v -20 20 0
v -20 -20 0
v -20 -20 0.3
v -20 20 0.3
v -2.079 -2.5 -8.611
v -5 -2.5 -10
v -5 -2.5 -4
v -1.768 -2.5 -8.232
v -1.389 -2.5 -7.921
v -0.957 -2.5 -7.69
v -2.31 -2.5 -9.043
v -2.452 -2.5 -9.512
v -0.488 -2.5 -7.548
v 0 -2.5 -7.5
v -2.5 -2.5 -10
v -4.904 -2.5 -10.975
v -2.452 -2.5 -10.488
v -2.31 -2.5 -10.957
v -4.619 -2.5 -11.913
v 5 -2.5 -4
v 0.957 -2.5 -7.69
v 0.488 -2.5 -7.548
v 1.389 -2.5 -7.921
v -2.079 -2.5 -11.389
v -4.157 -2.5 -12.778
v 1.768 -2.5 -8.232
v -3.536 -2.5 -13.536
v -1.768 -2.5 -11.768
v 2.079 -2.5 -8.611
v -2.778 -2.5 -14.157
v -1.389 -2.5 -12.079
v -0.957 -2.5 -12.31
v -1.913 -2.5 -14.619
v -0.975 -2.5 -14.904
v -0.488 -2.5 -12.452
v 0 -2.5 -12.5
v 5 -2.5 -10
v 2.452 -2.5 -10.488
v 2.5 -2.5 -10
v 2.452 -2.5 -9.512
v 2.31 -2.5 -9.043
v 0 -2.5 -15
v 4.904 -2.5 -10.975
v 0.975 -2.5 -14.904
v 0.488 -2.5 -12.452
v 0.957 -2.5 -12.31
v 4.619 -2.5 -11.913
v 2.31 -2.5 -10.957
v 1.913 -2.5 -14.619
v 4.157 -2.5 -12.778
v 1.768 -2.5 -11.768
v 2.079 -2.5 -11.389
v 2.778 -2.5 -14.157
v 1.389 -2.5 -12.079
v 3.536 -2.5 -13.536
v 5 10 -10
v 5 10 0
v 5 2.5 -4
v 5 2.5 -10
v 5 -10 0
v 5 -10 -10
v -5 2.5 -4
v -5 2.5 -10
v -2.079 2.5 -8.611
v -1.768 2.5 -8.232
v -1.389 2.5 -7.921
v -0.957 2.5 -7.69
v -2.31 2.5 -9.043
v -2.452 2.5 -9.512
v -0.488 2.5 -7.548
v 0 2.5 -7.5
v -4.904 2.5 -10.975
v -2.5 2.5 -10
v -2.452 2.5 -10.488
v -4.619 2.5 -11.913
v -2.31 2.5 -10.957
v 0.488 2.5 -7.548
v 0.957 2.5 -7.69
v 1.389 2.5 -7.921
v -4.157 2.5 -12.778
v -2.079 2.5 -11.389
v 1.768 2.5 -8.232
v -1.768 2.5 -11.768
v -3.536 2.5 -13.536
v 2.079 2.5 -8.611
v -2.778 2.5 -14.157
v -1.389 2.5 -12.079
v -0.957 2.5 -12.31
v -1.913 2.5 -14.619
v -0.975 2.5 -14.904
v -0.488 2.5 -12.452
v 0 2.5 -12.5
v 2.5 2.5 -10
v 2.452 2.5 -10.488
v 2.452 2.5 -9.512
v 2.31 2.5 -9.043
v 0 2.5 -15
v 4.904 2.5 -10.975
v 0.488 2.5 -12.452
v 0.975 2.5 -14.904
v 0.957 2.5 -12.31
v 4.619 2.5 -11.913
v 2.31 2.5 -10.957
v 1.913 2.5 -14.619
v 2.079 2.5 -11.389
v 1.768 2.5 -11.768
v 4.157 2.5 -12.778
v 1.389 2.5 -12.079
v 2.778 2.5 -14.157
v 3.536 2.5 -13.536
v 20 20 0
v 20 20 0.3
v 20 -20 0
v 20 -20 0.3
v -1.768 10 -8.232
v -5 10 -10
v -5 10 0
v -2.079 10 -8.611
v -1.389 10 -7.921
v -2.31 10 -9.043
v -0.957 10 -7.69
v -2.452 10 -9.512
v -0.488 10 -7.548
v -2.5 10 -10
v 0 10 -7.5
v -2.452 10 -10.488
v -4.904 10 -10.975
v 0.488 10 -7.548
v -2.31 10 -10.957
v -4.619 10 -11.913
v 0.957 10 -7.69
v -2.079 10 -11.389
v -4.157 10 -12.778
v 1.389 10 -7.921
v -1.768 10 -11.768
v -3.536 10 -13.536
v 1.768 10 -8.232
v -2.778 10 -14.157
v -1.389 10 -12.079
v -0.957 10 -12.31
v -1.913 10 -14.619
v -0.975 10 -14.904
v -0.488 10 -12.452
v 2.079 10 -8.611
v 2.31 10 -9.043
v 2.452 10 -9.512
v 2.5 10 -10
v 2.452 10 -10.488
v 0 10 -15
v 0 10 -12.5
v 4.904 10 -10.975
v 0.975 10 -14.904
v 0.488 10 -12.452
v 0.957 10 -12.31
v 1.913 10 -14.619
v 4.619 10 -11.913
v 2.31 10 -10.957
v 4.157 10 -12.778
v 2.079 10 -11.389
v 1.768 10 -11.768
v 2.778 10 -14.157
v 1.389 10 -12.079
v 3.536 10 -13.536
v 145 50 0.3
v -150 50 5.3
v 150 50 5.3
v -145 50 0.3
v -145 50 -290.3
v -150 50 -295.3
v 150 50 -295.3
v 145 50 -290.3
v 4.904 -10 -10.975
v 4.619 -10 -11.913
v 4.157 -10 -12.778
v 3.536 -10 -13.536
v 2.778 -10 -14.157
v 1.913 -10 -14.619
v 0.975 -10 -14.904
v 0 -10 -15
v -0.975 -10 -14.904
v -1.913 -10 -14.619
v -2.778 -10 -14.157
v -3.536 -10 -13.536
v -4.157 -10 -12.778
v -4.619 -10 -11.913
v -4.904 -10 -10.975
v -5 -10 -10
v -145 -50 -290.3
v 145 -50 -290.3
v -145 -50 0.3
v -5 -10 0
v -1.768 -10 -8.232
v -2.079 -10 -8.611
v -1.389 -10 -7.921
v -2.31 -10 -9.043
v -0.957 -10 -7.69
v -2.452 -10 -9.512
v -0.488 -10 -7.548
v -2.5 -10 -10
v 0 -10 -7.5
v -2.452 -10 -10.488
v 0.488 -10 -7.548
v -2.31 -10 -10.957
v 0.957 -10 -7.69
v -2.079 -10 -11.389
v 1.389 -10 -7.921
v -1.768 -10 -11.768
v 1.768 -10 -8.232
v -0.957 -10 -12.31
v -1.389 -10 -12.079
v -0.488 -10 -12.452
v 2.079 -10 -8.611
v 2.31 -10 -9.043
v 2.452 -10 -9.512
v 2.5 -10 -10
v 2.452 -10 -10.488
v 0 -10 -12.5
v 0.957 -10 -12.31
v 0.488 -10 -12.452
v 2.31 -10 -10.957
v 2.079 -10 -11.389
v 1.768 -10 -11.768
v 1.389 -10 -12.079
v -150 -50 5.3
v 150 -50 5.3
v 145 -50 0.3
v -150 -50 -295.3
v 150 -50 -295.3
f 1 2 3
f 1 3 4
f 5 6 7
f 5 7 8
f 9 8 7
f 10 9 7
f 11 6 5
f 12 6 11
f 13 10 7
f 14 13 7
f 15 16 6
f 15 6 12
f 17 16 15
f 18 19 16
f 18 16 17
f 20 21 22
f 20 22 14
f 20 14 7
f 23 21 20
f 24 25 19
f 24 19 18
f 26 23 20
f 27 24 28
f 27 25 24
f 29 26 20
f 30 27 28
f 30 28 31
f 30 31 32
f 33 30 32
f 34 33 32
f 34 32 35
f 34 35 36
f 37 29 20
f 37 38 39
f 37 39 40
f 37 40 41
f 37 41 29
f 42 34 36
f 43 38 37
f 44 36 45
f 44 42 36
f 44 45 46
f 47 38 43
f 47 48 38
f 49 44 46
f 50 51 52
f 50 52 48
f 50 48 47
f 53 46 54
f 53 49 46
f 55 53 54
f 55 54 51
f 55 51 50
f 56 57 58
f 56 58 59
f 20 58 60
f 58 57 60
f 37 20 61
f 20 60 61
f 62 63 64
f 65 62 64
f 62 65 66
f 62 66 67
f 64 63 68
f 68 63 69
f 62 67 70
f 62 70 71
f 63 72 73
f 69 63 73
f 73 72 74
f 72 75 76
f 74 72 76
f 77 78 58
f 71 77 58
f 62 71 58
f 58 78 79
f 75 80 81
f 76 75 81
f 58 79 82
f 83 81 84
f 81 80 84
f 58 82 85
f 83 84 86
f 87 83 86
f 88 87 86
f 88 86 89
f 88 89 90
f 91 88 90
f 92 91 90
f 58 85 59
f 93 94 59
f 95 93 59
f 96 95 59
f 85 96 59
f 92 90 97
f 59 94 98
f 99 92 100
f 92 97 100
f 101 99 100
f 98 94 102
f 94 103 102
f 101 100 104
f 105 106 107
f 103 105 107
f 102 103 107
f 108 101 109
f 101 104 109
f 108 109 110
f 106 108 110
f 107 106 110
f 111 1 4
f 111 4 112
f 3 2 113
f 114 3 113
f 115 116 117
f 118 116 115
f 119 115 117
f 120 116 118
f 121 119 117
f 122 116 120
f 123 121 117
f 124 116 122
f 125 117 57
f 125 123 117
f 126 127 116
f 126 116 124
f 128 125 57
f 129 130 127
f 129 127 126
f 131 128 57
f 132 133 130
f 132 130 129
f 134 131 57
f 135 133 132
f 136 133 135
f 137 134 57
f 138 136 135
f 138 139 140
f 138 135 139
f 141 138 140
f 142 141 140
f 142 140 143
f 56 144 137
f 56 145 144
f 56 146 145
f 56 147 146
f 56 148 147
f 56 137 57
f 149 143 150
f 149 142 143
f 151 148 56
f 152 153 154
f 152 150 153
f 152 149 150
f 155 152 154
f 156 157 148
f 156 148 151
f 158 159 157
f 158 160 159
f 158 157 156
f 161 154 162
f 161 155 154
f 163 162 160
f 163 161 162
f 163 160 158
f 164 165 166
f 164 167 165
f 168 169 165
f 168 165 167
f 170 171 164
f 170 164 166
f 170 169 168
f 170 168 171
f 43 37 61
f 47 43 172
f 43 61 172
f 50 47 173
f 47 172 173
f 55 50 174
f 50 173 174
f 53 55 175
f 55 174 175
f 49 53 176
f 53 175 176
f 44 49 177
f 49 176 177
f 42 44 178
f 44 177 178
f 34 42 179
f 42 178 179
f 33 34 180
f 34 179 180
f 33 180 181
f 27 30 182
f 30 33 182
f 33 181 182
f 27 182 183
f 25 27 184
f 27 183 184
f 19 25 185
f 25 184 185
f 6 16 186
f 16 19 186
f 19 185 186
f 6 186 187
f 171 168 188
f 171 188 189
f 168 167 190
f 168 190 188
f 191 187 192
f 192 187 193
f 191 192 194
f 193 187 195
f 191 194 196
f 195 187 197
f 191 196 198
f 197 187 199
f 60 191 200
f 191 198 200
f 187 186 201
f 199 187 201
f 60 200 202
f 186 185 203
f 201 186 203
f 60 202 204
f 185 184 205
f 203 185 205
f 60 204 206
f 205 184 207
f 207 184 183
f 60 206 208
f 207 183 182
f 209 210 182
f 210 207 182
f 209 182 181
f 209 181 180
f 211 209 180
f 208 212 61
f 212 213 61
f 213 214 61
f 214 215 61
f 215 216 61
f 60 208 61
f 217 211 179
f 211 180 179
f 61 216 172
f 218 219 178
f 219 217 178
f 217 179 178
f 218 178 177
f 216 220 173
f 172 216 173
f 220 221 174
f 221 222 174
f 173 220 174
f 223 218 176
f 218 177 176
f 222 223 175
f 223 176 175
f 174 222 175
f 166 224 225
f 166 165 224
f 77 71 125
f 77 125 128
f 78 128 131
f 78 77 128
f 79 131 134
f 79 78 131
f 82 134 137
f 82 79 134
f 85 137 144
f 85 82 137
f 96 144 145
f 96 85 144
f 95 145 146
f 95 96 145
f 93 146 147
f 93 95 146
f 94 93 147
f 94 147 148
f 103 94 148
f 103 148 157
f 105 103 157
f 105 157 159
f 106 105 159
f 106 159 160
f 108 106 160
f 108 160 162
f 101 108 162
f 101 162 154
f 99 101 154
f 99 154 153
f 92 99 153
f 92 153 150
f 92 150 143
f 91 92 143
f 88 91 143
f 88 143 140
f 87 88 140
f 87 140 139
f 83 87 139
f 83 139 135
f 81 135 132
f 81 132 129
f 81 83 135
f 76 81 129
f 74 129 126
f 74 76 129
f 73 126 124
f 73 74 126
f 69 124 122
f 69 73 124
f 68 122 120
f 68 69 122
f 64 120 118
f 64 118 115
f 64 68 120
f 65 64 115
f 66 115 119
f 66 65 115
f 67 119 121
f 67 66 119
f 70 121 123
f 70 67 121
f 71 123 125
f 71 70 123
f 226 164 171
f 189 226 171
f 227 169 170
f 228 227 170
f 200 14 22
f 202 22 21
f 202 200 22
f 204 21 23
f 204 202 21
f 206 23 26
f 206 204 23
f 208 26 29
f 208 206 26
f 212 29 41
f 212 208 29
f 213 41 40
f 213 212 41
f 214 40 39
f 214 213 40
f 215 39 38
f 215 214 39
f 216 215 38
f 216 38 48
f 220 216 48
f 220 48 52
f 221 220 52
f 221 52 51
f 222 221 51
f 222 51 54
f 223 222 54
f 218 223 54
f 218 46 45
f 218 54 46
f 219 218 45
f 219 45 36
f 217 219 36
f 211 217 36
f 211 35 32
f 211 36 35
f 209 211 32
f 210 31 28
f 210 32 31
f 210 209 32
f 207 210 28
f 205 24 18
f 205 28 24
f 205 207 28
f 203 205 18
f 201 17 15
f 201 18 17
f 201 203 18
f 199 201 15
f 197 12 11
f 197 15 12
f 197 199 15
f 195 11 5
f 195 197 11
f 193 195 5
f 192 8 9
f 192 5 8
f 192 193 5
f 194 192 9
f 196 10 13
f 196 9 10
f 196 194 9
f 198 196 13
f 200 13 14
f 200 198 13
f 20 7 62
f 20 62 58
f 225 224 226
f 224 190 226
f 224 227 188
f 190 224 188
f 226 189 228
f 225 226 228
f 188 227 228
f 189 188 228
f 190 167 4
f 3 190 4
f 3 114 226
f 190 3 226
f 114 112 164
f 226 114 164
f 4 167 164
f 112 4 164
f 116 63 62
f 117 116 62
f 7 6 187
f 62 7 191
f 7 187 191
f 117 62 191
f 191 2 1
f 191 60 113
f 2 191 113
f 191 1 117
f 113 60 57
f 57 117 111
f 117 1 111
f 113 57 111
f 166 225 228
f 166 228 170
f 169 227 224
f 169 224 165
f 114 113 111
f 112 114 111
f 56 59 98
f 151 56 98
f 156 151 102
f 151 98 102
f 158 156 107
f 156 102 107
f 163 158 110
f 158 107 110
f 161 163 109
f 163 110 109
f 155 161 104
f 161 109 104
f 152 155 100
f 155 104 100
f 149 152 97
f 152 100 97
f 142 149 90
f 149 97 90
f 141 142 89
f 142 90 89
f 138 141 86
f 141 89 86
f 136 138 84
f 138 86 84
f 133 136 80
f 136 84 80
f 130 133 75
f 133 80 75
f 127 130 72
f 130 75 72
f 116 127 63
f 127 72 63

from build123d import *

# Parameters (mm, degrees)
CROQUIS1_W                   = 40
CROQUIS1_H                   = 40
SALIENTE_EXTRUIR1_DEPTH      = 0.3
SALIENTE_EXTRUIR2_DEPTH      = 10
SALIENTE_EXTRUIR2_DEPTH_BACK = 10
CROQUIS2_R                   = 2.5
CORTAR_EXTRUIR1_DEPTH        = 2.5
CORTAR_EXTRUIR1_DEPTH_BACK   = 2.5
CROQUIS3_W                   = 14.056155144
CROQUIS3_H                   = 12
CROQUIS4_W                   = 300
CROQUIS4_H                   = 100
SALIENTE_EXTRUIR3_DEPTH      = 5
CROQUIS5_W                   = 300
CROQUIS5_H                   = 100
SALIENTE_EXTRUIR4_DEPTH      = 5


with BuildPart() as part:
    # Croquis1 → Saliente-Extruir1 (new body)
    with BuildSketch(Plane.XY):
        Rectangle(CROQUIS1_W, CROQUIS1_H)
    extrude(amount=SALIENTE_EXTRUIR1_DEPTH)

    # Croquis2 → Saliente-Extruir2 (add, two sides: drawn at the far end of the back side and taken through both)
    with BuildSketch(Plane(origin=(0, 0, 0), x_dir=(1, 0, 0), z_dir=(0, 1, 0)).offset(-SALIENTE_EXTRUIR2_DEPTH_BACK)):
        with BuildLine():
            Line((-5, 10), (-5, 0))
            Line((-5, 0), (5, 0))
            Line((5, 0), (5, 10))
            ThreePointArc((5, 10), (0, 15), (-5, 10))
        make_face()
        with Locations(Location((0, 10, 0), (0, 0, 270))):
            Circle(CROQUIS2_R, mode=Mode.SUBTRACT)
    extrude(amount=SALIENTE_EXTRUIR2_DEPTH + SALIENTE_EXTRUIR2_DEPTH_BACK)

    # Croquis3 → Cortar-Extruir1 (cut, two sides: drawn at the far end of the back side and taken through both)
    with BuildSketch(Plane(origin=(0, 0, 0), x_dir=(1, 0, 0), z_dir=(0, 1, 0)).offset(-CORTAR_EXTRUIR1_DEPTH_BACK)):
        with Locations((0, 10)):
            Rectangle(CROQUIS3_W, CROQUIS3_H)
    extrude(amount=CORTAR_EXTRUIR1_DEPTH + CORTAR_EXTRUIR1_DEPTH_BACK, mode=Mode.SUBTRACT)

    # Croquis4 → Saliente-Extruir3 (add)
    with BuildSketch(Plane.XY.offset(0.3)):
        Rectangle(CROQUIS4_W, CROQUIS4_H)
    saliente_extruir3 = extrude(amount=SALIENTE_EXTRUIR3_DEPTH)

    # Croquis5 → Saliente-Extruir4 (add)
    with BuildSketch(Plane(origin=(150, 0, 0), x_dir=(0, 0, -1), z_dir=(1, 0, 0))):
        with Locations((144.7, 0)):
            Rectangle(CROQUIS5_W, CROQUIS5_H)
    saliente_extruir4 = extrude(amount=-SALIENTE_EXTRUIR4_DEPTH)

    # Simetría2: Saliente-Extruir4 across plane
    add(saliente_extruir4.mirror(Plane(origin=(0, 0, 0), x_dir=(0, 0, 1), z_dir=(1, 0, 0))))

    # Simetría3: Saliente-Extruir3 across plane
    add(saliente_extruir3.mirror(Plane.XY.offset(-145)))


solid = part.part
